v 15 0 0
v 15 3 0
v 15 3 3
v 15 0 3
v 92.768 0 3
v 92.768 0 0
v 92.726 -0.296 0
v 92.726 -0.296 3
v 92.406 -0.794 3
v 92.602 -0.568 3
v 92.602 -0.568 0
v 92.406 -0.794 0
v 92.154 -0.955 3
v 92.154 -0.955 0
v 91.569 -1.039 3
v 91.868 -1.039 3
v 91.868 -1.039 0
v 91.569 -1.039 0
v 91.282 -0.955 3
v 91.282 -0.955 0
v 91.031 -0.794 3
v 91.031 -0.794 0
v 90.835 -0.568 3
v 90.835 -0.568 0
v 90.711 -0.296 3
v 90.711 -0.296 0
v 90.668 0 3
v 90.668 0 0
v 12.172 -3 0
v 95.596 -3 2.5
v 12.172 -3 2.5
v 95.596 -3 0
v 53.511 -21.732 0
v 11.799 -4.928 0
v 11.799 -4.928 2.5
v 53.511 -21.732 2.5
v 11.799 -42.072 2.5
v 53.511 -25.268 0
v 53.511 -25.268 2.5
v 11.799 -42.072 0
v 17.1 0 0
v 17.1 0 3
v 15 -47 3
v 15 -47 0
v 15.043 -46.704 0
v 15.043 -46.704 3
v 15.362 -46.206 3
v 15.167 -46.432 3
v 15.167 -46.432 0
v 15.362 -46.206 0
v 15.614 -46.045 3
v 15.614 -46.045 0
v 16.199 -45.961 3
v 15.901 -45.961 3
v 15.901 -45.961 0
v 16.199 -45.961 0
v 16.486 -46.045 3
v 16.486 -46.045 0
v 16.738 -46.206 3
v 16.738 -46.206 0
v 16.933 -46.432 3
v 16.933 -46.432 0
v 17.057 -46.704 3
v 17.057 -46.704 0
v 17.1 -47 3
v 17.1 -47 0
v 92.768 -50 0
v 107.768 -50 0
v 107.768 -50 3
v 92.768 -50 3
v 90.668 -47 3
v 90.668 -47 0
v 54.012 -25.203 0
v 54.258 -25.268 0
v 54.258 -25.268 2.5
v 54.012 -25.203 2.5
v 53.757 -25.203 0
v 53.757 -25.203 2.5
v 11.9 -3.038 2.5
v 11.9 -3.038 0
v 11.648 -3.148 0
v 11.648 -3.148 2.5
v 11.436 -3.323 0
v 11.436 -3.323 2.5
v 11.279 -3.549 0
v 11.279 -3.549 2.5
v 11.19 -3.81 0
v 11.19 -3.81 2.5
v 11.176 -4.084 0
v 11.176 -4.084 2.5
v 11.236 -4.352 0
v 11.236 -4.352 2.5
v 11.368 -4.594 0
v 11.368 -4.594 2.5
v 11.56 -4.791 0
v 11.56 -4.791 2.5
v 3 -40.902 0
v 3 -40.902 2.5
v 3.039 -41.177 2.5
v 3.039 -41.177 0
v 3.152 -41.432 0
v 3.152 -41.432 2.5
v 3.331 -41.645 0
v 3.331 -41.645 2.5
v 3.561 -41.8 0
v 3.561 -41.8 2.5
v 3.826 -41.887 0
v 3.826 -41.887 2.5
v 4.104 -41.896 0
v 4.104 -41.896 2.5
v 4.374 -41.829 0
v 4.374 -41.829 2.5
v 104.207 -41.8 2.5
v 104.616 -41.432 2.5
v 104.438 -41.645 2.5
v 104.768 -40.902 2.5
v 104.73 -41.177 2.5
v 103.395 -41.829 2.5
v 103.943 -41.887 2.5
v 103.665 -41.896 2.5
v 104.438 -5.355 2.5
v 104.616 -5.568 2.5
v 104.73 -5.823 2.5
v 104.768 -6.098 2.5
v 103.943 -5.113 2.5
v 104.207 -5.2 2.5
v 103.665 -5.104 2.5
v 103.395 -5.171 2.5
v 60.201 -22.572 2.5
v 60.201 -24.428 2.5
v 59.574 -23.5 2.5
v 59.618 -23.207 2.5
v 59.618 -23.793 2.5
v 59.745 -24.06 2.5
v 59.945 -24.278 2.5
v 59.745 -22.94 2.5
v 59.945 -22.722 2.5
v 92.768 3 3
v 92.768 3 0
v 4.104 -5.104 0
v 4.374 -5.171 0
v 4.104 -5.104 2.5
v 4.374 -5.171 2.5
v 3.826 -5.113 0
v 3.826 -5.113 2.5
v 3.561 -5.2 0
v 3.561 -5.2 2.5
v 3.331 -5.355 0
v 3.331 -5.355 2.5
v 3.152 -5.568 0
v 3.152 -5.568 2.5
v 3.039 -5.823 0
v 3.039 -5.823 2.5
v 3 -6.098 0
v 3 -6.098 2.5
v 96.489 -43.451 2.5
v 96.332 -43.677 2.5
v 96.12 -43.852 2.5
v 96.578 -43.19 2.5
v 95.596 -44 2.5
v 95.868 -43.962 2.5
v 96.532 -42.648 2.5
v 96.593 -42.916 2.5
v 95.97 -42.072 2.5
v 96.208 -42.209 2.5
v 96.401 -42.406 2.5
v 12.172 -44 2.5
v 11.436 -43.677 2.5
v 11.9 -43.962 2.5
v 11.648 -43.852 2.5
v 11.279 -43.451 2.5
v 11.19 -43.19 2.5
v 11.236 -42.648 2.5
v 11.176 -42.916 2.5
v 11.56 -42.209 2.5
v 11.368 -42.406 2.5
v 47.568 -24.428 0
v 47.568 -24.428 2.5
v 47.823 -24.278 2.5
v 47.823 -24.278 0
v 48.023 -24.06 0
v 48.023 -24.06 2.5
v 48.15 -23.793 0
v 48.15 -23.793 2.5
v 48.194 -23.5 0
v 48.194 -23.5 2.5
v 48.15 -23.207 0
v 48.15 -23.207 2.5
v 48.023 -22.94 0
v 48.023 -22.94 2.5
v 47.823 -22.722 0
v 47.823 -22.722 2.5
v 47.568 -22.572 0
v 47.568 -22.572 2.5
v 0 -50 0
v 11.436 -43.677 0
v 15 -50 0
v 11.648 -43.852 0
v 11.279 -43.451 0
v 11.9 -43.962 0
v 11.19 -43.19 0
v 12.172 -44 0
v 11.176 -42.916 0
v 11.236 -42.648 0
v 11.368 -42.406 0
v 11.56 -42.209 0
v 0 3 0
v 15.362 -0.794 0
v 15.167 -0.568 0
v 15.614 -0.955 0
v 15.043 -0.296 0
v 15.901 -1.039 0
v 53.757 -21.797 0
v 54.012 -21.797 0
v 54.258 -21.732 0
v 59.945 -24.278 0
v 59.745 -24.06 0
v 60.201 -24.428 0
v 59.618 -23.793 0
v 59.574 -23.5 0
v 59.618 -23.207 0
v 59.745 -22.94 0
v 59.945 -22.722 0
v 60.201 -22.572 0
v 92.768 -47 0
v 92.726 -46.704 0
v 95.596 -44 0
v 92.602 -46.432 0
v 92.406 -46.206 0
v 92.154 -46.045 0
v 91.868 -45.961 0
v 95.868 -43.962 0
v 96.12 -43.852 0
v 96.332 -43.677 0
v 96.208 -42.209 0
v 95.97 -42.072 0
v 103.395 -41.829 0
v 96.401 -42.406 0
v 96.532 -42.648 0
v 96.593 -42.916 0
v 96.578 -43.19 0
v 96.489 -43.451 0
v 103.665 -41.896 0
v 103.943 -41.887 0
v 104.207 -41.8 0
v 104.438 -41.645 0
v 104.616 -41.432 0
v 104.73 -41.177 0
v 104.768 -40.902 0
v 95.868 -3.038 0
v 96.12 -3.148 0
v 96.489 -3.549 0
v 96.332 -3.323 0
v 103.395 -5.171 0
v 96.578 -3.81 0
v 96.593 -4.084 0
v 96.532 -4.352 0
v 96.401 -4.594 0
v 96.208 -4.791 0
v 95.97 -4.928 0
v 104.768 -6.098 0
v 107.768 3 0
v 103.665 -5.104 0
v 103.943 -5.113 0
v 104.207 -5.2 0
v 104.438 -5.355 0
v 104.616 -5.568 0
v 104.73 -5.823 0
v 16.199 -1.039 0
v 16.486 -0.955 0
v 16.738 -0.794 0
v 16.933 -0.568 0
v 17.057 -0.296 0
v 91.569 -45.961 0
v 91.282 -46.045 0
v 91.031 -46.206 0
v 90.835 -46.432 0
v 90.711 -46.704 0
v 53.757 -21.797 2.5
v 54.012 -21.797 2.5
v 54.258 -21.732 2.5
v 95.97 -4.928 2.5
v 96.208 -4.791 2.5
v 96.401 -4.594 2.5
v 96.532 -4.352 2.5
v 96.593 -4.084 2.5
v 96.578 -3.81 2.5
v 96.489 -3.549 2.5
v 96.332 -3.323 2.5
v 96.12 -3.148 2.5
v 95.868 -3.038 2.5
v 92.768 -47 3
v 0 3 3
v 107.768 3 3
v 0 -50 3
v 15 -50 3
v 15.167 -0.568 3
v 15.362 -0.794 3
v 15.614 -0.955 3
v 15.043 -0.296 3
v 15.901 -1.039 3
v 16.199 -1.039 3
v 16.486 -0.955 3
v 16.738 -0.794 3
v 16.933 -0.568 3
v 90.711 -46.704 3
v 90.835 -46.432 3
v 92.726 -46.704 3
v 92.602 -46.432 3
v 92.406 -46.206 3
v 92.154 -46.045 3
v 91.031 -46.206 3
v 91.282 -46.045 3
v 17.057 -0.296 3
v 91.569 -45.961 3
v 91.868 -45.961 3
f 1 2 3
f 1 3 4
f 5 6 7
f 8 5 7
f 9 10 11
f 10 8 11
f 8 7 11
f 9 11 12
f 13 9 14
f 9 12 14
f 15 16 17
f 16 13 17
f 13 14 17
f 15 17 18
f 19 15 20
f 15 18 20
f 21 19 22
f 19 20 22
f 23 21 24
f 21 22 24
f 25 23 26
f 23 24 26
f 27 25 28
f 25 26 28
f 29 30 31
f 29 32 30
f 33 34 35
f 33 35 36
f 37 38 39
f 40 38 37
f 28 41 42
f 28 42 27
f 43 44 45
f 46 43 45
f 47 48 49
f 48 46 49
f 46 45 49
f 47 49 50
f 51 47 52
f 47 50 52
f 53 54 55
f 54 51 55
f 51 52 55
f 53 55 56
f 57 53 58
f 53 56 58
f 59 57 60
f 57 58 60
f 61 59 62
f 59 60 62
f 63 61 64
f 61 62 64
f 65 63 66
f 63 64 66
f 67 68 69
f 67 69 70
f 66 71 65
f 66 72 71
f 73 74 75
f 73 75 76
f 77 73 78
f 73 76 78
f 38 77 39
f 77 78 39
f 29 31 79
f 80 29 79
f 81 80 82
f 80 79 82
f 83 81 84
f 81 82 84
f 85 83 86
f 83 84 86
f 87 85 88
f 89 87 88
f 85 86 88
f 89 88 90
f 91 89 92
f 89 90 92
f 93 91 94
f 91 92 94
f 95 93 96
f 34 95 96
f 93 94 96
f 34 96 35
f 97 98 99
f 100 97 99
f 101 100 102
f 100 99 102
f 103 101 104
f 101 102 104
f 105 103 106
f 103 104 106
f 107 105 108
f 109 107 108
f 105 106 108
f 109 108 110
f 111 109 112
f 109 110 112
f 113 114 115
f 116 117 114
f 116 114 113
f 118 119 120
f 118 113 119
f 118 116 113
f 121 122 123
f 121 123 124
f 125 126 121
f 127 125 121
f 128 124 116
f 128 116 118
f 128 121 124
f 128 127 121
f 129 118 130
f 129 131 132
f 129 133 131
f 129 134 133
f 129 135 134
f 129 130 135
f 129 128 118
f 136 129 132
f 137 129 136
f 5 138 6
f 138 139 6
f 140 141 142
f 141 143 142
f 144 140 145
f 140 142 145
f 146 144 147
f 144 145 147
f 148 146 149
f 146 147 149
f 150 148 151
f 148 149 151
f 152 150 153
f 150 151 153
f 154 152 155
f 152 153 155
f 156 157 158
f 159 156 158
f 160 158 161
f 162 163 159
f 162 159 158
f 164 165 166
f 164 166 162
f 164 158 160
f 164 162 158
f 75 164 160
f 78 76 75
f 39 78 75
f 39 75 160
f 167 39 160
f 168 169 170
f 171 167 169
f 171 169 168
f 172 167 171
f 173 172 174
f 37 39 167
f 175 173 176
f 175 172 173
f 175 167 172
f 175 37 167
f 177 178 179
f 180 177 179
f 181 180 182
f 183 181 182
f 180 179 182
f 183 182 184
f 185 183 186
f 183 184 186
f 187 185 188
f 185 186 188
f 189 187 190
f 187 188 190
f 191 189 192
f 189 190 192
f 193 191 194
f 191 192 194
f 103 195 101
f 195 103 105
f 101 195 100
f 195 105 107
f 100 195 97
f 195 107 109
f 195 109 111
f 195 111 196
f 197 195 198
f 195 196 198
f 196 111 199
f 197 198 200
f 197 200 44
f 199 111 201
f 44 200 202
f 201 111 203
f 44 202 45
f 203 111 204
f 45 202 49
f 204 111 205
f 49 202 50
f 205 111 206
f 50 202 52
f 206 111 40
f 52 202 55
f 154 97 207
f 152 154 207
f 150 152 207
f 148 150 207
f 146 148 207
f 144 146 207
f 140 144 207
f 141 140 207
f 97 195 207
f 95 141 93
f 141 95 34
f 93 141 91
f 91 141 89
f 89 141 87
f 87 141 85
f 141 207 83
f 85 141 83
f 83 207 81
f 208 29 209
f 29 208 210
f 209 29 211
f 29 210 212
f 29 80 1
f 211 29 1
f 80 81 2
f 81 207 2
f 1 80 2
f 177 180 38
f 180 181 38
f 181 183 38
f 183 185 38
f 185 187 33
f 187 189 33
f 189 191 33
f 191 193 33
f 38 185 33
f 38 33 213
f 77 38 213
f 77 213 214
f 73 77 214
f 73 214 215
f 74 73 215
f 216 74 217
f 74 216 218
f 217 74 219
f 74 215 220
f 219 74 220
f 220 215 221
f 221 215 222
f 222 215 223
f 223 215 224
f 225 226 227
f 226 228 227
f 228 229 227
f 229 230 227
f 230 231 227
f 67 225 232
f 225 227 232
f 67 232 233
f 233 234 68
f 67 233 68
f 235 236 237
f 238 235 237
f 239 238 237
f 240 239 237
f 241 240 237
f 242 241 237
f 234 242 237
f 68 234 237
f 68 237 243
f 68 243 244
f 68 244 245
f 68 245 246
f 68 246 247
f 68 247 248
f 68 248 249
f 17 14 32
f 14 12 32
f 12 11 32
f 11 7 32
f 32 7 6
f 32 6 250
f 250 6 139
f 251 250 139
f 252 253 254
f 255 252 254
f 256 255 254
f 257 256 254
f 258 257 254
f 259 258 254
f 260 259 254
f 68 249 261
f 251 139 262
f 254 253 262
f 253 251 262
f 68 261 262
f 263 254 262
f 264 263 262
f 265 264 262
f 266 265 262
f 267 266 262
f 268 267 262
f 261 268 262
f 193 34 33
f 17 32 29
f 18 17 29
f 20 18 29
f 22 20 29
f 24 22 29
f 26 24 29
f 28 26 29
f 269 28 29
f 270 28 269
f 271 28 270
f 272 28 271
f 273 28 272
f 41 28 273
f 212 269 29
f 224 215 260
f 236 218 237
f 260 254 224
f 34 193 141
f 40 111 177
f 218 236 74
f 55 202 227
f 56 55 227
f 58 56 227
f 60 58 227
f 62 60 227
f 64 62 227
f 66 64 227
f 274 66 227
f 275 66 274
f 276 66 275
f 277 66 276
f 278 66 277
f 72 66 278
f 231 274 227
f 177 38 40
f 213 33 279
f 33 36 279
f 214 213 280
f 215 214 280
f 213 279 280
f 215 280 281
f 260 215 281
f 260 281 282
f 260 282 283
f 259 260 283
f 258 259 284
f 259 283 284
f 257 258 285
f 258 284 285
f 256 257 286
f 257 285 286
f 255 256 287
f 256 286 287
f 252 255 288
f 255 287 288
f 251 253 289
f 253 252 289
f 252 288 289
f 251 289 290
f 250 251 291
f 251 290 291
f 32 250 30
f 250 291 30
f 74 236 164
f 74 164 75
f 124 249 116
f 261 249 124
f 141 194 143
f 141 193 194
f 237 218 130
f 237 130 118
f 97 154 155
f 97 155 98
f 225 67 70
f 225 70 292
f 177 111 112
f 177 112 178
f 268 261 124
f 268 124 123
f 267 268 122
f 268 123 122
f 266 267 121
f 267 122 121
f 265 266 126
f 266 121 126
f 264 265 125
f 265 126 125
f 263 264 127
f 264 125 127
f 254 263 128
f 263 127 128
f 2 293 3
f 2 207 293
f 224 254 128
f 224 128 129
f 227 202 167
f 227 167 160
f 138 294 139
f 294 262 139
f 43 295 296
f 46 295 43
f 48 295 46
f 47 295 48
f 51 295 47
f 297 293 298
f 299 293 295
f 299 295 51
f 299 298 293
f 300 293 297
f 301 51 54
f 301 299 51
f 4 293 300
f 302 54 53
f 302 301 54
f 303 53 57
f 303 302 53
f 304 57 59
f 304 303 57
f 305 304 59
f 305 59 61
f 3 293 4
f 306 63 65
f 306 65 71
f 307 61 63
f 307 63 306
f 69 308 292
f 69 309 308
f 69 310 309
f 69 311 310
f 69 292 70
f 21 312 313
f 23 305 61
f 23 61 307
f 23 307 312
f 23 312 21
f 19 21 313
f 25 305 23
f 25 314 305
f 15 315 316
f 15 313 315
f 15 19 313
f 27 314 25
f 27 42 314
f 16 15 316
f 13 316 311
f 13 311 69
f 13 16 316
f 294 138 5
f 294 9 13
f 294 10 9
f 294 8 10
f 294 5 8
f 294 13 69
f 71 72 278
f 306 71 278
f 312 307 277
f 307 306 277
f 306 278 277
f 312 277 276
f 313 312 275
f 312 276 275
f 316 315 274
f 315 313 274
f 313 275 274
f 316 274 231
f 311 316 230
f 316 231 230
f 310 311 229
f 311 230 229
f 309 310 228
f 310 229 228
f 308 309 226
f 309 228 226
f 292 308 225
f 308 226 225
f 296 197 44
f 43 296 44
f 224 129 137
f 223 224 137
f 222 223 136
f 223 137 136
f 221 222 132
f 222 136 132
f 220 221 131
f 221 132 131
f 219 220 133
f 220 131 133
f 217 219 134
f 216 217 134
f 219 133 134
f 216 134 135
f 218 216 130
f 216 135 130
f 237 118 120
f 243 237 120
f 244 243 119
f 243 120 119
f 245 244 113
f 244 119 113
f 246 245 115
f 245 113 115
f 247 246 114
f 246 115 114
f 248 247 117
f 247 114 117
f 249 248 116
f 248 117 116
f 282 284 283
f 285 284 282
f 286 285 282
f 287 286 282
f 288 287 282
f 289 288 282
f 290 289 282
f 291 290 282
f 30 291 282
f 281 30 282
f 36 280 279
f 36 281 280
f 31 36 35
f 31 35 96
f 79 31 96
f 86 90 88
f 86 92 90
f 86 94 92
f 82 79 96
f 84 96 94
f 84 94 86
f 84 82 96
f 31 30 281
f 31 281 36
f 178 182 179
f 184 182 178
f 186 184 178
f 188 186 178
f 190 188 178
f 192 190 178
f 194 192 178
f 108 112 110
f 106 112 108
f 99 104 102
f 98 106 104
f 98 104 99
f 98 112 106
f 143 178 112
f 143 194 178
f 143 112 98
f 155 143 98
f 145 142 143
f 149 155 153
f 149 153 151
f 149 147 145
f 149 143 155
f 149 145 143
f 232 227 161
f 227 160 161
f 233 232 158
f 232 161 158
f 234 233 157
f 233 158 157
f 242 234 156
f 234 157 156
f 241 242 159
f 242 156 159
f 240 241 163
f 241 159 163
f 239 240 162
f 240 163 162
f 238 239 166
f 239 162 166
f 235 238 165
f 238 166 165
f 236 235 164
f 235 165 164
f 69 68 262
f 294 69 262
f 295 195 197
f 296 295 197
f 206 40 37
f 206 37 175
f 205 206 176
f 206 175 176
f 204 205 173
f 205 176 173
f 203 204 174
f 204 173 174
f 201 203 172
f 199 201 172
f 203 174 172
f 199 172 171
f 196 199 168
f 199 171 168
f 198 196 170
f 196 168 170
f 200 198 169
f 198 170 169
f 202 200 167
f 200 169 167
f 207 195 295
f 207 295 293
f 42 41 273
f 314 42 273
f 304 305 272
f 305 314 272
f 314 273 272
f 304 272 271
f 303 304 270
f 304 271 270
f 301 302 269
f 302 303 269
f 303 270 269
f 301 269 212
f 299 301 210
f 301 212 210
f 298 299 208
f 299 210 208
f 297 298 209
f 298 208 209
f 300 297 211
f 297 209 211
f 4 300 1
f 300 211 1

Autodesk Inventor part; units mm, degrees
ref_plane "YZ Plane" through (0, 0, 0) normal (1, 0, 0) x (0, 1, 0)
ref_plane "XZ Plane" through (0, 0, 0) normal (0, 1, 0) x (-1, 0, 0)
ref_plane "XY Plane" through (0, 0, 0) normal (0, 0, 1) x (1, 0, 0)
sketch "スケッチ1" plane through (0, 0, 0) normal (0, 0, 1) x (1, 0, 0)
  circle A0 centre (-35.9404, 22.842) radius 1.5
  circle A1 centre (5.9362, 53.5882) radius 1.5
  circle A2 centre (127.6431, 30.2622) radius 1.5
  line L0 (22.1499, 50.4807) -> (113.9448, 32.8876)
  circle A3 centre (5.9362, 53.5882) radius 4.5
  circle A4 centre (127.6431, 30.2622) radius 4.5
  circle A5 centre (-35.9404, 22.842) radius 3
  line L1 (5.0892, 49.1686) -> (11.145, 48.008)
  line L2 (11.145, 48.008) -> (22.1499, 50.4807)
  line L3 (113.9448, 32.8876) -> (122.4523, 26.6751)
  line L4 (122.4523, 26.6751) -> (126.7961, 25.8426)
  line L5 (4.4419, 57.8328) -> (15.2047, 61.622)
  line L6 (-37.785, 25.2079) -> (3.1694, 57.1371)
  line L7 (3.5126, 49.7966) -> (-34.0959, 20.4761)
  line L8 (122.0018, 41.1536) -> (130.601, 33.6535)
  circle A6 centre (80.3181, 36.2778) radius 3
  circle A7 centre (80.3181, 36.2778) radius 4.5
  line L9 (128.2106, 34.7263) -> (80.8855, 40.7419)
  circle A8 centre (80.4743, 23.124) radius 1.5
  line L10 (120.4636, 35.711) -> (121.0283, 38.6574)
  line L11 (15.1864, 58.9428) -> (14.6217, 55.9964)
  circle A9 centre (66.9779, 42.9073) radius 1.5
  circle A10 centre (66.9779, 42.9073) radius 3
  line L12 (29.9182, 56.1193) -> (29.3535, 53.1729)
  arc A11 (17.2488, 58.5475) -> (15.1864, 58.9428) centre (16.2176, 58.7451) ccw
  arc A12 (29.9182, 56.1193) -> (27.8558, 56.5146) centre (28.887, 56.3169) ccw
  arc A13 (27.2911, 53.5682) -> (29.3535, 53.1729) centre (28.3223, 53.3705) ccw
  arc A14 (14.6217, 55.9964) -> (16.6841, 55.6011) centre (15.6529, 55.7987) ccw
  line L13 (17.2488, 58.5475) -> (27.8558, 56.5146)
  line L14 (16.6841, 55.6011) -> (27.2911, 53.5682)
  arc A15 (31.8825, 55.7428) -> (27.0019, 58.7146) centre (28.887, 56.3169) ccw
  line L15 (27.0019, 58.7146) -> (18.8556, 60.2759)
  arc A16 (18.8556, 60.2759) -> (15.2047, 61.622) centre (16.2176, 58.7451) ccw
  line L16 (106.2964, 41.4808) -> (105.7317, 38.5345)
  arc A17 (108.3589, 41.0856) -> (106.2964, 41.4808) centre (107.3276, 41.2832) ccw
  arc A18 (121.0283, 38.6574) -> (118.9658, 39.0527) centre (119.997, 38.855) ccw
  arc A19 (118.4011, 36.1063) -> (120.4636, 35.711) centre (119.4323, 35.9086) ccw
  arc A20 (105.7317, 38.5345) -> (107.7942, 38.1392) centre (106.7629, 38.3368) ccw
  line L17 (31.8825, 55.7428) -> (104.3322, 41.8573)
  line L18 (108.3589, 41.0856) -> (118.9658, 39.0527)
  line L19 (107.7942, 38.1392) -> (118.4011, 36.1063)
  arc A21 (122.0018, 41.1536) -> (118.1119, 41.2527) centre (119.997, 38.855) ccw
  line L20 (118.1119, 41.2527) -> (109.9656, 42.814)
  arc A22 (109.9656, 42.814) -> (104.3322, 41.8573) centre (107.3276, 41.2832) ccw
  line L21 (30.3885, 58.9717) -> (38.2584, 54.5208)
  line L22 (16.7917, 61.7406) -> (29.4611, 59.3124)
  line L23 (120.5711, 41.8505) -> (107.9017, 44.2787)
  line L24 (106.8479, 44.2952) -> (98.5267, 42.97)
  point P0 (0, 0)
  point P1 (0, 0)
  point P2 (0, 0)
  dimension "d53" = 9
  dimension "d49" = 9
  dimension "d50" = 9
  dimension "d51" = 6
  dimension "d52" = 6
  dimension "d54" = 47.7059
  dimension "d55" = 47.7059
  dimension "d56" = 3
  dimension "d57" = 3
  dimension "d58" = 8.0769
  dimension "d59" = 8.0769
  dimension "d60" = 3
  dimension "d61" = 6
  dimension "d62" = 61.9691
  dimension "d63" = 61.9691
  dimension "d64" = 15
  dimension "d65" = 2.1
  dimension "d66" = 2
  dimension "d67" = 2
  dimension "d68" = 2
  dimension "d69" = 15
  dimension "d70" = 2.1
  dimension "d71" = 7
  dimension "d72" = 2
  dimension "d73" = 2
sketch "スケッチ2" plane through (0, 0, 0) normal (0, 0, 1) x (1, 0, 0)
  line L0 (17.1, 0) -> (90.6683, 0)
  line L1 (107.7683, 0) -> (107.7683, -47)
  line L2 (90.6683, -47) -> (17.1, -47)
  line L3 (0, -47) -> (0, 0)
  line L4 (0, 0) -> (0, 3)
  line L5 (0, 3) -> (15, 3)
  line L6 (15, 3) -> (15, 0)
  line L7 (107.7683, 0) -> (107.7683, 3)
  line L8 (107.7683, 3) -> (92.7683, 3)
  line L9 (92.7683, 3) -> (92.7683, 0)
  line L10 (107.7683, -47) -> (107.7683, -50)
  line L11 (107.7683, -50) -> (92.7683, -50)
  line L12 (92.7683, -50) -> (92.7683, -47)
  line L13 (0, -47) -> (0, -50)
  line L14 (0, -50) -> (15, -50)
  line L15 (15, -50) -> (15, -47)
  arc A0 (15, 0) -> (17.1, 0) centre (16.05, 0) ccw
  arc A1 (90.6683, 0) -> (92.7683, 0) centre (91.7183, 0) ccw
  arc A2 (92.7683, -47) -> (90.6683, -47) centre (91.7183, -47) ccw
  arc A3 (17.1, -47) -> (15, -47) centre (16.05, -47) ccw
  line L16 (15.1864, 58.9428) -> (14.6217, 55.9964) projected
  line L17 (120.4636, 35.711) -> (121.0283, 38.6574) projected
  dimension "d30" = 107.7683
  dimension "d31" = 47
  dimension "d32" = 3
  dimension "d33" = 15
  dimension "d34" = 3
  dimension "d35" = 15
  dimension "d36" = 3
  dimension "d37" = 15
  dimension "d38" = 3
  dimension "d39" = 3
  dimension "d40" = 15
  dimension "d41" = 2.1
  dimension "d42" = 2.1
  dimension "d43" = 2.1
  dimension "d44" = 2.1
  dimension "d45" = 3
  dimension "d46" = 3
  dimension "d74" = 107.7683
extrude "押し出し1" add sketch "スケッチ2" along normal blind 3
sketch "スケッチ3" plane through (0, 0, 0) normal (0, 0, -1) x (-1, 0, 0)
  line L0 (0, 3) -> (0, -50) projected
  line L1 (-15, 3) -> (0, 3) projected
  line L2 (-15, 0) -> (-15, 3) projected
  arc A0 (-17.1, 0) -> (-15, 0) centre (-16.05, 0) ccw projected
  line L3 (-90.6683, 0) -> (-17.1, 0) projected
  arc A1 (-92.7683, 0) -> (-90.6683, 0) centre (-91.7183, 0) ccw projected
  line L4 (-92.7683, 3) -> (-92.7683, 0) projected
  line L5 (-107.7683, 3) -> (-92.7683, 3) projected
  line L6 (-107.7683, -50) -> (-107.7683, 3) projected
  line L7 (-92.7683, -50) -> (-107.7683, -50) projected
  line L8 (-92.7683, -47) -> (-92.7683, -50) projected
  arc A2 (-90.6683, -47) -> (-92.7683, -47) centre (-91.7183, -47) ccw projected
  line L9 (-17.1, -47) -> (-90.6683, -47) projected
  arc A3 (-15, -47) -> (-17.1, -47) centre (-16.05, -47) ccw projected
  line L10 (-15, -50) -> (-15, -47) projected
  line L11 (0, -50) -> (-15, -50) projected
  line L12 (-104.7683, -3) -> (-3, -3)
  line L13 (-3, -3) -> (-3, -44)
  line L14 (-3, -44) -> (-104.7683, -44)
  line L15 (-104.7683, -44) -> (-104.7683, -3)
  line L16 (-104.7683, -3) -> (-3, -44) construction
  arc A4 (-104.2078, -1.6087) -> (-106.2683, -3) centre (-104.7683, -3) ccw
  arc A5 (-3.5605, -45.3913) -> (-2.4395, -42.6087) centre (-3, -44) ccw
  line L17 (-3, -3) -> (-104.7683, -44) construction
  arc A6 (-2.4395, -4.3913) -> (-3.5605, -1.6087) centre (-3, -3) ccw
  arc A7 (-105.3288, -42.6087) -> (-104.2078, -45.3913) centre (-104.7683, -44) ccw
  line L18 (-3, -42.3828) -> (-49.8701, -23.5)
  line L19 (-53.8842, -21.8828) -> (-100.7543, -3)
  line L20 (-100.7543, -44) -> (-53.8842, -25.1172)
  line L21 (-49.8701, -23.5) -> (-3, -4.6172)
  line L22 (-104.7683, -4.6172) -> (-57.8982, -23.5)
  line L23 (-53.8842, -25.1172) -> (-7.014, -44)
  line L24 (-7.014, -3) -> (-53.8842, -21.8828)
  line L25 (-57.8982, -23.5) -> (-104.7683, -42.3828)
  point P0 (0, 0)
  point P1 (-53.8842, -23.5)
  point P2 (-53.8842, -23.5)
  dimension "d75" = 3
  dimension "d76" = 3
  dimension "d77" = 3
  dimension "d78" = 3
  dimension "d79" = 3
  dimension "d80" = 3
extrude "押し出し2" cut sketch "スケッチ3" against normal blind 2.5 contours L12 L24 L19 | L22 L25 L15 | L13 L18 L21 | L20 L23 L14
fillet "フィレット1" radius 1 12 edges at (100.7543, -3, 1.25) (104.7683, -4.6172, 1.25) (104.7683, -42.3828, 1.25) (100.7543, -44, 1.25) (57.8982, -23.5, 1.25) (53.8842, -21.8828, 1.25) (53.8842, -25.1172, 1.25) (49.8701, -23.5, 1.25) (7.014, -44, 1.25) (3, -42.3828, 1.25) (3, -4.6172, 1.25) (7.014, -3, 1.25)
equation "\"d55\" = d54"
equation "\"d59\" = d58"
equation "\"d63\" = d62"
equation "\"d30\" = d74"
properties part number "台形サスバー板" material "ポリカーボネート、クリア"
